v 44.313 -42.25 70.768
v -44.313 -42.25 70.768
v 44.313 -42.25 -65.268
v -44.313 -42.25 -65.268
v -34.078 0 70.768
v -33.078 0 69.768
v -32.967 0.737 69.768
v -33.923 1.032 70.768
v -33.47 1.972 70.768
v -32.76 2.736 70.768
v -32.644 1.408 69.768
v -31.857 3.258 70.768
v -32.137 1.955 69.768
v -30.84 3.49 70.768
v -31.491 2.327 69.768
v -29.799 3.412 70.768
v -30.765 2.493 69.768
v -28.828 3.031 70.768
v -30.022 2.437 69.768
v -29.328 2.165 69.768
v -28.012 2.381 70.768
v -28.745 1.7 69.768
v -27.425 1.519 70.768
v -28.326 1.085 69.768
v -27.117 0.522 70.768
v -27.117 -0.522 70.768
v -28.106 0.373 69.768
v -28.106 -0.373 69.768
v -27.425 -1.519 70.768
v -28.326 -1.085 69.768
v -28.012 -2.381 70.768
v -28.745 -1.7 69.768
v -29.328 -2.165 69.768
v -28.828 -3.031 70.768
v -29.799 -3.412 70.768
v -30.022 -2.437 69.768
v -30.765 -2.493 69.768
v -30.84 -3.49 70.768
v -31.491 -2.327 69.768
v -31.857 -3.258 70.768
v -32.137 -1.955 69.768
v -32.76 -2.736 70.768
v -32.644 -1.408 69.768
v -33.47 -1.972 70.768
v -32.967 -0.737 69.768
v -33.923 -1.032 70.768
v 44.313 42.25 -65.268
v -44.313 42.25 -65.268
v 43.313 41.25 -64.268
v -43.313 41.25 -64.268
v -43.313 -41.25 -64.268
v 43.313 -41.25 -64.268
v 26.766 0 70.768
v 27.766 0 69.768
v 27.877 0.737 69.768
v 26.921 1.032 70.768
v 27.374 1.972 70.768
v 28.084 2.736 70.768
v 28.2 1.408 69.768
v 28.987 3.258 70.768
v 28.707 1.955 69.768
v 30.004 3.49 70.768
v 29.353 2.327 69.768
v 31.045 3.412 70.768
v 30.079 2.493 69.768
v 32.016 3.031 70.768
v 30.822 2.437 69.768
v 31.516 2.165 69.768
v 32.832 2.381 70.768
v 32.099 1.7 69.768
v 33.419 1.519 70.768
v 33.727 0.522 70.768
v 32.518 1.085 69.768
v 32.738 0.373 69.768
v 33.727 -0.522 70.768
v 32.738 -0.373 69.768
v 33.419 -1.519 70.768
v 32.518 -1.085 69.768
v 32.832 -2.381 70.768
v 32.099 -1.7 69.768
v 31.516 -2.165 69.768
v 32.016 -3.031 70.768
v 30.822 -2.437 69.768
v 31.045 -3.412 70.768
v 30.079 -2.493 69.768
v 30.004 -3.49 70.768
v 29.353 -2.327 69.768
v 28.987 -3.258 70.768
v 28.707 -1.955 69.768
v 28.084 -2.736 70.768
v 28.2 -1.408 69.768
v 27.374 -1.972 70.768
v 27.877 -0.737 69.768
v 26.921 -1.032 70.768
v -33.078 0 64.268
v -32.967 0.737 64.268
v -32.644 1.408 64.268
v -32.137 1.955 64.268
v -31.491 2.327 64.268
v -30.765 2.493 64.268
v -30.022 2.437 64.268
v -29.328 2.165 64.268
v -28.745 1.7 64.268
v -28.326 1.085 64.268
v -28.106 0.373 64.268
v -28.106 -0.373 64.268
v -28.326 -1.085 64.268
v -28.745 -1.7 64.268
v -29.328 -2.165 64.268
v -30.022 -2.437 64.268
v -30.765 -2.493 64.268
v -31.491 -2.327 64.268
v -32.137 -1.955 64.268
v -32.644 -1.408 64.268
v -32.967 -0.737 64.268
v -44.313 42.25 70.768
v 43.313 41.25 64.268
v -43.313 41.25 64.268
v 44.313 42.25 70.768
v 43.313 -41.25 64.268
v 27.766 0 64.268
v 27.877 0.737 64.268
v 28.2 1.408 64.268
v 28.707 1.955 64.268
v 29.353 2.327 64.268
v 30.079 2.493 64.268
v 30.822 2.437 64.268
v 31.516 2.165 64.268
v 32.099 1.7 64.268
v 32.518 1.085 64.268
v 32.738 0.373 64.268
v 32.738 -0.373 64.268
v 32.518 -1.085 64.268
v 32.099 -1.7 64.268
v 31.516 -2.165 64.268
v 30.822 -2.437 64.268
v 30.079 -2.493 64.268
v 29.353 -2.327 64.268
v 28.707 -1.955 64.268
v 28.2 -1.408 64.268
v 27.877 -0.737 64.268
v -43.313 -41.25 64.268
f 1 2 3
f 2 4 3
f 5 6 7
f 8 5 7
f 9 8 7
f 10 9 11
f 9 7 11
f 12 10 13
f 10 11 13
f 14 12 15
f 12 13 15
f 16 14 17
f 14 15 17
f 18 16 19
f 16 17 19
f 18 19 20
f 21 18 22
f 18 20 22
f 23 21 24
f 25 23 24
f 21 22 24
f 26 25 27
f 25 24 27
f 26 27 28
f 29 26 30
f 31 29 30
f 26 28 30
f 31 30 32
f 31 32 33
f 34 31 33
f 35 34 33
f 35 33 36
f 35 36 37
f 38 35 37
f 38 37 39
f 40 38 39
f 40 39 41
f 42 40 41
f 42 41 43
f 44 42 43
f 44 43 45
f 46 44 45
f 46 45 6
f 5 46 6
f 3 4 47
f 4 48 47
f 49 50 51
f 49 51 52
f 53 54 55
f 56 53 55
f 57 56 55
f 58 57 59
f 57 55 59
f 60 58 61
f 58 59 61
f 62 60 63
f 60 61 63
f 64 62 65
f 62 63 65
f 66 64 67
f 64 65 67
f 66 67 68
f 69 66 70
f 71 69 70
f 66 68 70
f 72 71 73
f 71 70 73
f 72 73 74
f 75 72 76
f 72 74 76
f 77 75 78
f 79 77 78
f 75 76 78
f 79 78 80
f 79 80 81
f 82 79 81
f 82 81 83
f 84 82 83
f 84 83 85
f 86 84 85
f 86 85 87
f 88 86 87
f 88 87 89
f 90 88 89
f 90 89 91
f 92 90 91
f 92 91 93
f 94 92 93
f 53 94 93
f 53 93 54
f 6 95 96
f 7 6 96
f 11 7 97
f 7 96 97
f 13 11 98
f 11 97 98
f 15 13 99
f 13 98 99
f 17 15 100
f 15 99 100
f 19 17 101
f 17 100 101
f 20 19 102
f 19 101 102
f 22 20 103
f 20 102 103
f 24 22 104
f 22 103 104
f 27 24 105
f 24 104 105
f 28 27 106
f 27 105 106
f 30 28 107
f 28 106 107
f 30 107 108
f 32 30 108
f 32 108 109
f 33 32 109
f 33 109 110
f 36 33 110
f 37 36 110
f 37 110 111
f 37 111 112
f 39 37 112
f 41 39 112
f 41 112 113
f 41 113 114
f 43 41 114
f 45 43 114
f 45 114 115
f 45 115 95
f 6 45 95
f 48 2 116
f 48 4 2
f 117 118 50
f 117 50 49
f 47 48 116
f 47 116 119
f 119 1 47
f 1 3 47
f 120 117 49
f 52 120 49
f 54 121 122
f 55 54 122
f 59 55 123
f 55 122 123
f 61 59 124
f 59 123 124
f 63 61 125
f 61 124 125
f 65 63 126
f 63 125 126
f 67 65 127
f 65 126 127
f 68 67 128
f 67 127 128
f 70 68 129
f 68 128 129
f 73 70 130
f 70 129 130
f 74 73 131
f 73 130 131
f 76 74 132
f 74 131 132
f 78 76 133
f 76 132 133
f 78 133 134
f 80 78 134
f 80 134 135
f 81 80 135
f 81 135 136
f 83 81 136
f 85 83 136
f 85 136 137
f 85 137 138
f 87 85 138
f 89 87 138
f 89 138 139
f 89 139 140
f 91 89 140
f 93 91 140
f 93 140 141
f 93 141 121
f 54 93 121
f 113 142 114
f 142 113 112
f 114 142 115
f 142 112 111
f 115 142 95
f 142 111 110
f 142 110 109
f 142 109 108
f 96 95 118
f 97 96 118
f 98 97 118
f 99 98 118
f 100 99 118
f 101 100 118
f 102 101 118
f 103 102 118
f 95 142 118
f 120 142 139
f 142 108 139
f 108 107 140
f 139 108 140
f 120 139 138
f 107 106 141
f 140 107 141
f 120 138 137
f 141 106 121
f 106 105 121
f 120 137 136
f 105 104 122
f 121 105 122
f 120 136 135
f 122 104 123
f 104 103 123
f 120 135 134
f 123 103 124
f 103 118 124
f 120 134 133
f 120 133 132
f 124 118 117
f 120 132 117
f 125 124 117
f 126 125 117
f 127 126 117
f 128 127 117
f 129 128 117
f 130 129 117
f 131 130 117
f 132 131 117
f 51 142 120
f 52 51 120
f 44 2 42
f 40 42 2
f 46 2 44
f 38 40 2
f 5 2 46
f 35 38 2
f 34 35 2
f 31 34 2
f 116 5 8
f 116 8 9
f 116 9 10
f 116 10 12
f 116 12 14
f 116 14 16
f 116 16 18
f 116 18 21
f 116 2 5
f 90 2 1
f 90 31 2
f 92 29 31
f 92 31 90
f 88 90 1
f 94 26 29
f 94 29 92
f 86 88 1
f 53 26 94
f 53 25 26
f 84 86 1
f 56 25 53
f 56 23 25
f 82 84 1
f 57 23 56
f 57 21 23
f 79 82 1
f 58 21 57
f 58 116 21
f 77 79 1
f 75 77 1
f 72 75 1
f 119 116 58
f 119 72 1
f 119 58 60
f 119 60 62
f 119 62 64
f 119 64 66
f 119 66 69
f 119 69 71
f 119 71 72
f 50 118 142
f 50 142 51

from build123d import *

# Parameters (mm, degrees)
SKETCH4_W                       = 88.626489964
SKETCH4_H                       = 130.535595586
BOSS_EXTRUDE3_DEPTH             = 42.25
SHELL1_T                        = 1
SKETCH5_W                       = 88.626489964
SKETCH5_H                       = 84.5
BOSS_EXTRUDE4_DEPTH             = 5.5
M6X1_0_TAPPED_HOLE1_D           = 5
M6X1_0_TAPPED_HOLE1_DEPTH       = 6.5
M6X1_0_TAPPED_HOLE1_CSINK_D     = 7
M6X1_0_TAPPED_HOLE1_CSINK_ANGLE = 90


with BuildPart() as part:
    # Sketch4 → Boss-Extrude3 (new body, symmetric)
    with BuildSketch(Plane(origin=(0, 0, 0), x_dir=(1, 0, 0), z_dir=(0, 1, 0))):
        Rectangle(SKETCH4_W, SKETCH4_H)
    extrude(amount=BOSS_EXTRUDE3_DEPTH, both=True)

    # Shell1 (no face opened: a closed hollow body)
    add(offset(amount=-SHELL1_T, mode=Mode.PRIVATE), mode=Mode.SUBTRACT)

    # Sketch5 → Boss-Extrude4 (add)
    with BuildSketch(Plane.XY.offset(65.267797793)):
        Rectangle(SKETCH5_W, SKETCH5_H)
    extrude(amount=BOSS_EXTRUDE4_DEPTH)

    # M6x1.0 Tapped Hole1
    with Locations(Plane.XY.offset(70.767797793)):
        with Locations((30.265999315, 0), (-30.578112918, 0)):
            CounterSinkHole(M6X1_0_TAPPED_HOLE1_D / 2, M6X1_0_TAPPED_HOLE1_CSINK_D / 2, depth=M6X1_0_TAPPED_HOLE1_DEPTH, counter_sink_angle=M6X1_0_TAPPED_HOLE1_CSINK_ANGLE)


solid = part.part
